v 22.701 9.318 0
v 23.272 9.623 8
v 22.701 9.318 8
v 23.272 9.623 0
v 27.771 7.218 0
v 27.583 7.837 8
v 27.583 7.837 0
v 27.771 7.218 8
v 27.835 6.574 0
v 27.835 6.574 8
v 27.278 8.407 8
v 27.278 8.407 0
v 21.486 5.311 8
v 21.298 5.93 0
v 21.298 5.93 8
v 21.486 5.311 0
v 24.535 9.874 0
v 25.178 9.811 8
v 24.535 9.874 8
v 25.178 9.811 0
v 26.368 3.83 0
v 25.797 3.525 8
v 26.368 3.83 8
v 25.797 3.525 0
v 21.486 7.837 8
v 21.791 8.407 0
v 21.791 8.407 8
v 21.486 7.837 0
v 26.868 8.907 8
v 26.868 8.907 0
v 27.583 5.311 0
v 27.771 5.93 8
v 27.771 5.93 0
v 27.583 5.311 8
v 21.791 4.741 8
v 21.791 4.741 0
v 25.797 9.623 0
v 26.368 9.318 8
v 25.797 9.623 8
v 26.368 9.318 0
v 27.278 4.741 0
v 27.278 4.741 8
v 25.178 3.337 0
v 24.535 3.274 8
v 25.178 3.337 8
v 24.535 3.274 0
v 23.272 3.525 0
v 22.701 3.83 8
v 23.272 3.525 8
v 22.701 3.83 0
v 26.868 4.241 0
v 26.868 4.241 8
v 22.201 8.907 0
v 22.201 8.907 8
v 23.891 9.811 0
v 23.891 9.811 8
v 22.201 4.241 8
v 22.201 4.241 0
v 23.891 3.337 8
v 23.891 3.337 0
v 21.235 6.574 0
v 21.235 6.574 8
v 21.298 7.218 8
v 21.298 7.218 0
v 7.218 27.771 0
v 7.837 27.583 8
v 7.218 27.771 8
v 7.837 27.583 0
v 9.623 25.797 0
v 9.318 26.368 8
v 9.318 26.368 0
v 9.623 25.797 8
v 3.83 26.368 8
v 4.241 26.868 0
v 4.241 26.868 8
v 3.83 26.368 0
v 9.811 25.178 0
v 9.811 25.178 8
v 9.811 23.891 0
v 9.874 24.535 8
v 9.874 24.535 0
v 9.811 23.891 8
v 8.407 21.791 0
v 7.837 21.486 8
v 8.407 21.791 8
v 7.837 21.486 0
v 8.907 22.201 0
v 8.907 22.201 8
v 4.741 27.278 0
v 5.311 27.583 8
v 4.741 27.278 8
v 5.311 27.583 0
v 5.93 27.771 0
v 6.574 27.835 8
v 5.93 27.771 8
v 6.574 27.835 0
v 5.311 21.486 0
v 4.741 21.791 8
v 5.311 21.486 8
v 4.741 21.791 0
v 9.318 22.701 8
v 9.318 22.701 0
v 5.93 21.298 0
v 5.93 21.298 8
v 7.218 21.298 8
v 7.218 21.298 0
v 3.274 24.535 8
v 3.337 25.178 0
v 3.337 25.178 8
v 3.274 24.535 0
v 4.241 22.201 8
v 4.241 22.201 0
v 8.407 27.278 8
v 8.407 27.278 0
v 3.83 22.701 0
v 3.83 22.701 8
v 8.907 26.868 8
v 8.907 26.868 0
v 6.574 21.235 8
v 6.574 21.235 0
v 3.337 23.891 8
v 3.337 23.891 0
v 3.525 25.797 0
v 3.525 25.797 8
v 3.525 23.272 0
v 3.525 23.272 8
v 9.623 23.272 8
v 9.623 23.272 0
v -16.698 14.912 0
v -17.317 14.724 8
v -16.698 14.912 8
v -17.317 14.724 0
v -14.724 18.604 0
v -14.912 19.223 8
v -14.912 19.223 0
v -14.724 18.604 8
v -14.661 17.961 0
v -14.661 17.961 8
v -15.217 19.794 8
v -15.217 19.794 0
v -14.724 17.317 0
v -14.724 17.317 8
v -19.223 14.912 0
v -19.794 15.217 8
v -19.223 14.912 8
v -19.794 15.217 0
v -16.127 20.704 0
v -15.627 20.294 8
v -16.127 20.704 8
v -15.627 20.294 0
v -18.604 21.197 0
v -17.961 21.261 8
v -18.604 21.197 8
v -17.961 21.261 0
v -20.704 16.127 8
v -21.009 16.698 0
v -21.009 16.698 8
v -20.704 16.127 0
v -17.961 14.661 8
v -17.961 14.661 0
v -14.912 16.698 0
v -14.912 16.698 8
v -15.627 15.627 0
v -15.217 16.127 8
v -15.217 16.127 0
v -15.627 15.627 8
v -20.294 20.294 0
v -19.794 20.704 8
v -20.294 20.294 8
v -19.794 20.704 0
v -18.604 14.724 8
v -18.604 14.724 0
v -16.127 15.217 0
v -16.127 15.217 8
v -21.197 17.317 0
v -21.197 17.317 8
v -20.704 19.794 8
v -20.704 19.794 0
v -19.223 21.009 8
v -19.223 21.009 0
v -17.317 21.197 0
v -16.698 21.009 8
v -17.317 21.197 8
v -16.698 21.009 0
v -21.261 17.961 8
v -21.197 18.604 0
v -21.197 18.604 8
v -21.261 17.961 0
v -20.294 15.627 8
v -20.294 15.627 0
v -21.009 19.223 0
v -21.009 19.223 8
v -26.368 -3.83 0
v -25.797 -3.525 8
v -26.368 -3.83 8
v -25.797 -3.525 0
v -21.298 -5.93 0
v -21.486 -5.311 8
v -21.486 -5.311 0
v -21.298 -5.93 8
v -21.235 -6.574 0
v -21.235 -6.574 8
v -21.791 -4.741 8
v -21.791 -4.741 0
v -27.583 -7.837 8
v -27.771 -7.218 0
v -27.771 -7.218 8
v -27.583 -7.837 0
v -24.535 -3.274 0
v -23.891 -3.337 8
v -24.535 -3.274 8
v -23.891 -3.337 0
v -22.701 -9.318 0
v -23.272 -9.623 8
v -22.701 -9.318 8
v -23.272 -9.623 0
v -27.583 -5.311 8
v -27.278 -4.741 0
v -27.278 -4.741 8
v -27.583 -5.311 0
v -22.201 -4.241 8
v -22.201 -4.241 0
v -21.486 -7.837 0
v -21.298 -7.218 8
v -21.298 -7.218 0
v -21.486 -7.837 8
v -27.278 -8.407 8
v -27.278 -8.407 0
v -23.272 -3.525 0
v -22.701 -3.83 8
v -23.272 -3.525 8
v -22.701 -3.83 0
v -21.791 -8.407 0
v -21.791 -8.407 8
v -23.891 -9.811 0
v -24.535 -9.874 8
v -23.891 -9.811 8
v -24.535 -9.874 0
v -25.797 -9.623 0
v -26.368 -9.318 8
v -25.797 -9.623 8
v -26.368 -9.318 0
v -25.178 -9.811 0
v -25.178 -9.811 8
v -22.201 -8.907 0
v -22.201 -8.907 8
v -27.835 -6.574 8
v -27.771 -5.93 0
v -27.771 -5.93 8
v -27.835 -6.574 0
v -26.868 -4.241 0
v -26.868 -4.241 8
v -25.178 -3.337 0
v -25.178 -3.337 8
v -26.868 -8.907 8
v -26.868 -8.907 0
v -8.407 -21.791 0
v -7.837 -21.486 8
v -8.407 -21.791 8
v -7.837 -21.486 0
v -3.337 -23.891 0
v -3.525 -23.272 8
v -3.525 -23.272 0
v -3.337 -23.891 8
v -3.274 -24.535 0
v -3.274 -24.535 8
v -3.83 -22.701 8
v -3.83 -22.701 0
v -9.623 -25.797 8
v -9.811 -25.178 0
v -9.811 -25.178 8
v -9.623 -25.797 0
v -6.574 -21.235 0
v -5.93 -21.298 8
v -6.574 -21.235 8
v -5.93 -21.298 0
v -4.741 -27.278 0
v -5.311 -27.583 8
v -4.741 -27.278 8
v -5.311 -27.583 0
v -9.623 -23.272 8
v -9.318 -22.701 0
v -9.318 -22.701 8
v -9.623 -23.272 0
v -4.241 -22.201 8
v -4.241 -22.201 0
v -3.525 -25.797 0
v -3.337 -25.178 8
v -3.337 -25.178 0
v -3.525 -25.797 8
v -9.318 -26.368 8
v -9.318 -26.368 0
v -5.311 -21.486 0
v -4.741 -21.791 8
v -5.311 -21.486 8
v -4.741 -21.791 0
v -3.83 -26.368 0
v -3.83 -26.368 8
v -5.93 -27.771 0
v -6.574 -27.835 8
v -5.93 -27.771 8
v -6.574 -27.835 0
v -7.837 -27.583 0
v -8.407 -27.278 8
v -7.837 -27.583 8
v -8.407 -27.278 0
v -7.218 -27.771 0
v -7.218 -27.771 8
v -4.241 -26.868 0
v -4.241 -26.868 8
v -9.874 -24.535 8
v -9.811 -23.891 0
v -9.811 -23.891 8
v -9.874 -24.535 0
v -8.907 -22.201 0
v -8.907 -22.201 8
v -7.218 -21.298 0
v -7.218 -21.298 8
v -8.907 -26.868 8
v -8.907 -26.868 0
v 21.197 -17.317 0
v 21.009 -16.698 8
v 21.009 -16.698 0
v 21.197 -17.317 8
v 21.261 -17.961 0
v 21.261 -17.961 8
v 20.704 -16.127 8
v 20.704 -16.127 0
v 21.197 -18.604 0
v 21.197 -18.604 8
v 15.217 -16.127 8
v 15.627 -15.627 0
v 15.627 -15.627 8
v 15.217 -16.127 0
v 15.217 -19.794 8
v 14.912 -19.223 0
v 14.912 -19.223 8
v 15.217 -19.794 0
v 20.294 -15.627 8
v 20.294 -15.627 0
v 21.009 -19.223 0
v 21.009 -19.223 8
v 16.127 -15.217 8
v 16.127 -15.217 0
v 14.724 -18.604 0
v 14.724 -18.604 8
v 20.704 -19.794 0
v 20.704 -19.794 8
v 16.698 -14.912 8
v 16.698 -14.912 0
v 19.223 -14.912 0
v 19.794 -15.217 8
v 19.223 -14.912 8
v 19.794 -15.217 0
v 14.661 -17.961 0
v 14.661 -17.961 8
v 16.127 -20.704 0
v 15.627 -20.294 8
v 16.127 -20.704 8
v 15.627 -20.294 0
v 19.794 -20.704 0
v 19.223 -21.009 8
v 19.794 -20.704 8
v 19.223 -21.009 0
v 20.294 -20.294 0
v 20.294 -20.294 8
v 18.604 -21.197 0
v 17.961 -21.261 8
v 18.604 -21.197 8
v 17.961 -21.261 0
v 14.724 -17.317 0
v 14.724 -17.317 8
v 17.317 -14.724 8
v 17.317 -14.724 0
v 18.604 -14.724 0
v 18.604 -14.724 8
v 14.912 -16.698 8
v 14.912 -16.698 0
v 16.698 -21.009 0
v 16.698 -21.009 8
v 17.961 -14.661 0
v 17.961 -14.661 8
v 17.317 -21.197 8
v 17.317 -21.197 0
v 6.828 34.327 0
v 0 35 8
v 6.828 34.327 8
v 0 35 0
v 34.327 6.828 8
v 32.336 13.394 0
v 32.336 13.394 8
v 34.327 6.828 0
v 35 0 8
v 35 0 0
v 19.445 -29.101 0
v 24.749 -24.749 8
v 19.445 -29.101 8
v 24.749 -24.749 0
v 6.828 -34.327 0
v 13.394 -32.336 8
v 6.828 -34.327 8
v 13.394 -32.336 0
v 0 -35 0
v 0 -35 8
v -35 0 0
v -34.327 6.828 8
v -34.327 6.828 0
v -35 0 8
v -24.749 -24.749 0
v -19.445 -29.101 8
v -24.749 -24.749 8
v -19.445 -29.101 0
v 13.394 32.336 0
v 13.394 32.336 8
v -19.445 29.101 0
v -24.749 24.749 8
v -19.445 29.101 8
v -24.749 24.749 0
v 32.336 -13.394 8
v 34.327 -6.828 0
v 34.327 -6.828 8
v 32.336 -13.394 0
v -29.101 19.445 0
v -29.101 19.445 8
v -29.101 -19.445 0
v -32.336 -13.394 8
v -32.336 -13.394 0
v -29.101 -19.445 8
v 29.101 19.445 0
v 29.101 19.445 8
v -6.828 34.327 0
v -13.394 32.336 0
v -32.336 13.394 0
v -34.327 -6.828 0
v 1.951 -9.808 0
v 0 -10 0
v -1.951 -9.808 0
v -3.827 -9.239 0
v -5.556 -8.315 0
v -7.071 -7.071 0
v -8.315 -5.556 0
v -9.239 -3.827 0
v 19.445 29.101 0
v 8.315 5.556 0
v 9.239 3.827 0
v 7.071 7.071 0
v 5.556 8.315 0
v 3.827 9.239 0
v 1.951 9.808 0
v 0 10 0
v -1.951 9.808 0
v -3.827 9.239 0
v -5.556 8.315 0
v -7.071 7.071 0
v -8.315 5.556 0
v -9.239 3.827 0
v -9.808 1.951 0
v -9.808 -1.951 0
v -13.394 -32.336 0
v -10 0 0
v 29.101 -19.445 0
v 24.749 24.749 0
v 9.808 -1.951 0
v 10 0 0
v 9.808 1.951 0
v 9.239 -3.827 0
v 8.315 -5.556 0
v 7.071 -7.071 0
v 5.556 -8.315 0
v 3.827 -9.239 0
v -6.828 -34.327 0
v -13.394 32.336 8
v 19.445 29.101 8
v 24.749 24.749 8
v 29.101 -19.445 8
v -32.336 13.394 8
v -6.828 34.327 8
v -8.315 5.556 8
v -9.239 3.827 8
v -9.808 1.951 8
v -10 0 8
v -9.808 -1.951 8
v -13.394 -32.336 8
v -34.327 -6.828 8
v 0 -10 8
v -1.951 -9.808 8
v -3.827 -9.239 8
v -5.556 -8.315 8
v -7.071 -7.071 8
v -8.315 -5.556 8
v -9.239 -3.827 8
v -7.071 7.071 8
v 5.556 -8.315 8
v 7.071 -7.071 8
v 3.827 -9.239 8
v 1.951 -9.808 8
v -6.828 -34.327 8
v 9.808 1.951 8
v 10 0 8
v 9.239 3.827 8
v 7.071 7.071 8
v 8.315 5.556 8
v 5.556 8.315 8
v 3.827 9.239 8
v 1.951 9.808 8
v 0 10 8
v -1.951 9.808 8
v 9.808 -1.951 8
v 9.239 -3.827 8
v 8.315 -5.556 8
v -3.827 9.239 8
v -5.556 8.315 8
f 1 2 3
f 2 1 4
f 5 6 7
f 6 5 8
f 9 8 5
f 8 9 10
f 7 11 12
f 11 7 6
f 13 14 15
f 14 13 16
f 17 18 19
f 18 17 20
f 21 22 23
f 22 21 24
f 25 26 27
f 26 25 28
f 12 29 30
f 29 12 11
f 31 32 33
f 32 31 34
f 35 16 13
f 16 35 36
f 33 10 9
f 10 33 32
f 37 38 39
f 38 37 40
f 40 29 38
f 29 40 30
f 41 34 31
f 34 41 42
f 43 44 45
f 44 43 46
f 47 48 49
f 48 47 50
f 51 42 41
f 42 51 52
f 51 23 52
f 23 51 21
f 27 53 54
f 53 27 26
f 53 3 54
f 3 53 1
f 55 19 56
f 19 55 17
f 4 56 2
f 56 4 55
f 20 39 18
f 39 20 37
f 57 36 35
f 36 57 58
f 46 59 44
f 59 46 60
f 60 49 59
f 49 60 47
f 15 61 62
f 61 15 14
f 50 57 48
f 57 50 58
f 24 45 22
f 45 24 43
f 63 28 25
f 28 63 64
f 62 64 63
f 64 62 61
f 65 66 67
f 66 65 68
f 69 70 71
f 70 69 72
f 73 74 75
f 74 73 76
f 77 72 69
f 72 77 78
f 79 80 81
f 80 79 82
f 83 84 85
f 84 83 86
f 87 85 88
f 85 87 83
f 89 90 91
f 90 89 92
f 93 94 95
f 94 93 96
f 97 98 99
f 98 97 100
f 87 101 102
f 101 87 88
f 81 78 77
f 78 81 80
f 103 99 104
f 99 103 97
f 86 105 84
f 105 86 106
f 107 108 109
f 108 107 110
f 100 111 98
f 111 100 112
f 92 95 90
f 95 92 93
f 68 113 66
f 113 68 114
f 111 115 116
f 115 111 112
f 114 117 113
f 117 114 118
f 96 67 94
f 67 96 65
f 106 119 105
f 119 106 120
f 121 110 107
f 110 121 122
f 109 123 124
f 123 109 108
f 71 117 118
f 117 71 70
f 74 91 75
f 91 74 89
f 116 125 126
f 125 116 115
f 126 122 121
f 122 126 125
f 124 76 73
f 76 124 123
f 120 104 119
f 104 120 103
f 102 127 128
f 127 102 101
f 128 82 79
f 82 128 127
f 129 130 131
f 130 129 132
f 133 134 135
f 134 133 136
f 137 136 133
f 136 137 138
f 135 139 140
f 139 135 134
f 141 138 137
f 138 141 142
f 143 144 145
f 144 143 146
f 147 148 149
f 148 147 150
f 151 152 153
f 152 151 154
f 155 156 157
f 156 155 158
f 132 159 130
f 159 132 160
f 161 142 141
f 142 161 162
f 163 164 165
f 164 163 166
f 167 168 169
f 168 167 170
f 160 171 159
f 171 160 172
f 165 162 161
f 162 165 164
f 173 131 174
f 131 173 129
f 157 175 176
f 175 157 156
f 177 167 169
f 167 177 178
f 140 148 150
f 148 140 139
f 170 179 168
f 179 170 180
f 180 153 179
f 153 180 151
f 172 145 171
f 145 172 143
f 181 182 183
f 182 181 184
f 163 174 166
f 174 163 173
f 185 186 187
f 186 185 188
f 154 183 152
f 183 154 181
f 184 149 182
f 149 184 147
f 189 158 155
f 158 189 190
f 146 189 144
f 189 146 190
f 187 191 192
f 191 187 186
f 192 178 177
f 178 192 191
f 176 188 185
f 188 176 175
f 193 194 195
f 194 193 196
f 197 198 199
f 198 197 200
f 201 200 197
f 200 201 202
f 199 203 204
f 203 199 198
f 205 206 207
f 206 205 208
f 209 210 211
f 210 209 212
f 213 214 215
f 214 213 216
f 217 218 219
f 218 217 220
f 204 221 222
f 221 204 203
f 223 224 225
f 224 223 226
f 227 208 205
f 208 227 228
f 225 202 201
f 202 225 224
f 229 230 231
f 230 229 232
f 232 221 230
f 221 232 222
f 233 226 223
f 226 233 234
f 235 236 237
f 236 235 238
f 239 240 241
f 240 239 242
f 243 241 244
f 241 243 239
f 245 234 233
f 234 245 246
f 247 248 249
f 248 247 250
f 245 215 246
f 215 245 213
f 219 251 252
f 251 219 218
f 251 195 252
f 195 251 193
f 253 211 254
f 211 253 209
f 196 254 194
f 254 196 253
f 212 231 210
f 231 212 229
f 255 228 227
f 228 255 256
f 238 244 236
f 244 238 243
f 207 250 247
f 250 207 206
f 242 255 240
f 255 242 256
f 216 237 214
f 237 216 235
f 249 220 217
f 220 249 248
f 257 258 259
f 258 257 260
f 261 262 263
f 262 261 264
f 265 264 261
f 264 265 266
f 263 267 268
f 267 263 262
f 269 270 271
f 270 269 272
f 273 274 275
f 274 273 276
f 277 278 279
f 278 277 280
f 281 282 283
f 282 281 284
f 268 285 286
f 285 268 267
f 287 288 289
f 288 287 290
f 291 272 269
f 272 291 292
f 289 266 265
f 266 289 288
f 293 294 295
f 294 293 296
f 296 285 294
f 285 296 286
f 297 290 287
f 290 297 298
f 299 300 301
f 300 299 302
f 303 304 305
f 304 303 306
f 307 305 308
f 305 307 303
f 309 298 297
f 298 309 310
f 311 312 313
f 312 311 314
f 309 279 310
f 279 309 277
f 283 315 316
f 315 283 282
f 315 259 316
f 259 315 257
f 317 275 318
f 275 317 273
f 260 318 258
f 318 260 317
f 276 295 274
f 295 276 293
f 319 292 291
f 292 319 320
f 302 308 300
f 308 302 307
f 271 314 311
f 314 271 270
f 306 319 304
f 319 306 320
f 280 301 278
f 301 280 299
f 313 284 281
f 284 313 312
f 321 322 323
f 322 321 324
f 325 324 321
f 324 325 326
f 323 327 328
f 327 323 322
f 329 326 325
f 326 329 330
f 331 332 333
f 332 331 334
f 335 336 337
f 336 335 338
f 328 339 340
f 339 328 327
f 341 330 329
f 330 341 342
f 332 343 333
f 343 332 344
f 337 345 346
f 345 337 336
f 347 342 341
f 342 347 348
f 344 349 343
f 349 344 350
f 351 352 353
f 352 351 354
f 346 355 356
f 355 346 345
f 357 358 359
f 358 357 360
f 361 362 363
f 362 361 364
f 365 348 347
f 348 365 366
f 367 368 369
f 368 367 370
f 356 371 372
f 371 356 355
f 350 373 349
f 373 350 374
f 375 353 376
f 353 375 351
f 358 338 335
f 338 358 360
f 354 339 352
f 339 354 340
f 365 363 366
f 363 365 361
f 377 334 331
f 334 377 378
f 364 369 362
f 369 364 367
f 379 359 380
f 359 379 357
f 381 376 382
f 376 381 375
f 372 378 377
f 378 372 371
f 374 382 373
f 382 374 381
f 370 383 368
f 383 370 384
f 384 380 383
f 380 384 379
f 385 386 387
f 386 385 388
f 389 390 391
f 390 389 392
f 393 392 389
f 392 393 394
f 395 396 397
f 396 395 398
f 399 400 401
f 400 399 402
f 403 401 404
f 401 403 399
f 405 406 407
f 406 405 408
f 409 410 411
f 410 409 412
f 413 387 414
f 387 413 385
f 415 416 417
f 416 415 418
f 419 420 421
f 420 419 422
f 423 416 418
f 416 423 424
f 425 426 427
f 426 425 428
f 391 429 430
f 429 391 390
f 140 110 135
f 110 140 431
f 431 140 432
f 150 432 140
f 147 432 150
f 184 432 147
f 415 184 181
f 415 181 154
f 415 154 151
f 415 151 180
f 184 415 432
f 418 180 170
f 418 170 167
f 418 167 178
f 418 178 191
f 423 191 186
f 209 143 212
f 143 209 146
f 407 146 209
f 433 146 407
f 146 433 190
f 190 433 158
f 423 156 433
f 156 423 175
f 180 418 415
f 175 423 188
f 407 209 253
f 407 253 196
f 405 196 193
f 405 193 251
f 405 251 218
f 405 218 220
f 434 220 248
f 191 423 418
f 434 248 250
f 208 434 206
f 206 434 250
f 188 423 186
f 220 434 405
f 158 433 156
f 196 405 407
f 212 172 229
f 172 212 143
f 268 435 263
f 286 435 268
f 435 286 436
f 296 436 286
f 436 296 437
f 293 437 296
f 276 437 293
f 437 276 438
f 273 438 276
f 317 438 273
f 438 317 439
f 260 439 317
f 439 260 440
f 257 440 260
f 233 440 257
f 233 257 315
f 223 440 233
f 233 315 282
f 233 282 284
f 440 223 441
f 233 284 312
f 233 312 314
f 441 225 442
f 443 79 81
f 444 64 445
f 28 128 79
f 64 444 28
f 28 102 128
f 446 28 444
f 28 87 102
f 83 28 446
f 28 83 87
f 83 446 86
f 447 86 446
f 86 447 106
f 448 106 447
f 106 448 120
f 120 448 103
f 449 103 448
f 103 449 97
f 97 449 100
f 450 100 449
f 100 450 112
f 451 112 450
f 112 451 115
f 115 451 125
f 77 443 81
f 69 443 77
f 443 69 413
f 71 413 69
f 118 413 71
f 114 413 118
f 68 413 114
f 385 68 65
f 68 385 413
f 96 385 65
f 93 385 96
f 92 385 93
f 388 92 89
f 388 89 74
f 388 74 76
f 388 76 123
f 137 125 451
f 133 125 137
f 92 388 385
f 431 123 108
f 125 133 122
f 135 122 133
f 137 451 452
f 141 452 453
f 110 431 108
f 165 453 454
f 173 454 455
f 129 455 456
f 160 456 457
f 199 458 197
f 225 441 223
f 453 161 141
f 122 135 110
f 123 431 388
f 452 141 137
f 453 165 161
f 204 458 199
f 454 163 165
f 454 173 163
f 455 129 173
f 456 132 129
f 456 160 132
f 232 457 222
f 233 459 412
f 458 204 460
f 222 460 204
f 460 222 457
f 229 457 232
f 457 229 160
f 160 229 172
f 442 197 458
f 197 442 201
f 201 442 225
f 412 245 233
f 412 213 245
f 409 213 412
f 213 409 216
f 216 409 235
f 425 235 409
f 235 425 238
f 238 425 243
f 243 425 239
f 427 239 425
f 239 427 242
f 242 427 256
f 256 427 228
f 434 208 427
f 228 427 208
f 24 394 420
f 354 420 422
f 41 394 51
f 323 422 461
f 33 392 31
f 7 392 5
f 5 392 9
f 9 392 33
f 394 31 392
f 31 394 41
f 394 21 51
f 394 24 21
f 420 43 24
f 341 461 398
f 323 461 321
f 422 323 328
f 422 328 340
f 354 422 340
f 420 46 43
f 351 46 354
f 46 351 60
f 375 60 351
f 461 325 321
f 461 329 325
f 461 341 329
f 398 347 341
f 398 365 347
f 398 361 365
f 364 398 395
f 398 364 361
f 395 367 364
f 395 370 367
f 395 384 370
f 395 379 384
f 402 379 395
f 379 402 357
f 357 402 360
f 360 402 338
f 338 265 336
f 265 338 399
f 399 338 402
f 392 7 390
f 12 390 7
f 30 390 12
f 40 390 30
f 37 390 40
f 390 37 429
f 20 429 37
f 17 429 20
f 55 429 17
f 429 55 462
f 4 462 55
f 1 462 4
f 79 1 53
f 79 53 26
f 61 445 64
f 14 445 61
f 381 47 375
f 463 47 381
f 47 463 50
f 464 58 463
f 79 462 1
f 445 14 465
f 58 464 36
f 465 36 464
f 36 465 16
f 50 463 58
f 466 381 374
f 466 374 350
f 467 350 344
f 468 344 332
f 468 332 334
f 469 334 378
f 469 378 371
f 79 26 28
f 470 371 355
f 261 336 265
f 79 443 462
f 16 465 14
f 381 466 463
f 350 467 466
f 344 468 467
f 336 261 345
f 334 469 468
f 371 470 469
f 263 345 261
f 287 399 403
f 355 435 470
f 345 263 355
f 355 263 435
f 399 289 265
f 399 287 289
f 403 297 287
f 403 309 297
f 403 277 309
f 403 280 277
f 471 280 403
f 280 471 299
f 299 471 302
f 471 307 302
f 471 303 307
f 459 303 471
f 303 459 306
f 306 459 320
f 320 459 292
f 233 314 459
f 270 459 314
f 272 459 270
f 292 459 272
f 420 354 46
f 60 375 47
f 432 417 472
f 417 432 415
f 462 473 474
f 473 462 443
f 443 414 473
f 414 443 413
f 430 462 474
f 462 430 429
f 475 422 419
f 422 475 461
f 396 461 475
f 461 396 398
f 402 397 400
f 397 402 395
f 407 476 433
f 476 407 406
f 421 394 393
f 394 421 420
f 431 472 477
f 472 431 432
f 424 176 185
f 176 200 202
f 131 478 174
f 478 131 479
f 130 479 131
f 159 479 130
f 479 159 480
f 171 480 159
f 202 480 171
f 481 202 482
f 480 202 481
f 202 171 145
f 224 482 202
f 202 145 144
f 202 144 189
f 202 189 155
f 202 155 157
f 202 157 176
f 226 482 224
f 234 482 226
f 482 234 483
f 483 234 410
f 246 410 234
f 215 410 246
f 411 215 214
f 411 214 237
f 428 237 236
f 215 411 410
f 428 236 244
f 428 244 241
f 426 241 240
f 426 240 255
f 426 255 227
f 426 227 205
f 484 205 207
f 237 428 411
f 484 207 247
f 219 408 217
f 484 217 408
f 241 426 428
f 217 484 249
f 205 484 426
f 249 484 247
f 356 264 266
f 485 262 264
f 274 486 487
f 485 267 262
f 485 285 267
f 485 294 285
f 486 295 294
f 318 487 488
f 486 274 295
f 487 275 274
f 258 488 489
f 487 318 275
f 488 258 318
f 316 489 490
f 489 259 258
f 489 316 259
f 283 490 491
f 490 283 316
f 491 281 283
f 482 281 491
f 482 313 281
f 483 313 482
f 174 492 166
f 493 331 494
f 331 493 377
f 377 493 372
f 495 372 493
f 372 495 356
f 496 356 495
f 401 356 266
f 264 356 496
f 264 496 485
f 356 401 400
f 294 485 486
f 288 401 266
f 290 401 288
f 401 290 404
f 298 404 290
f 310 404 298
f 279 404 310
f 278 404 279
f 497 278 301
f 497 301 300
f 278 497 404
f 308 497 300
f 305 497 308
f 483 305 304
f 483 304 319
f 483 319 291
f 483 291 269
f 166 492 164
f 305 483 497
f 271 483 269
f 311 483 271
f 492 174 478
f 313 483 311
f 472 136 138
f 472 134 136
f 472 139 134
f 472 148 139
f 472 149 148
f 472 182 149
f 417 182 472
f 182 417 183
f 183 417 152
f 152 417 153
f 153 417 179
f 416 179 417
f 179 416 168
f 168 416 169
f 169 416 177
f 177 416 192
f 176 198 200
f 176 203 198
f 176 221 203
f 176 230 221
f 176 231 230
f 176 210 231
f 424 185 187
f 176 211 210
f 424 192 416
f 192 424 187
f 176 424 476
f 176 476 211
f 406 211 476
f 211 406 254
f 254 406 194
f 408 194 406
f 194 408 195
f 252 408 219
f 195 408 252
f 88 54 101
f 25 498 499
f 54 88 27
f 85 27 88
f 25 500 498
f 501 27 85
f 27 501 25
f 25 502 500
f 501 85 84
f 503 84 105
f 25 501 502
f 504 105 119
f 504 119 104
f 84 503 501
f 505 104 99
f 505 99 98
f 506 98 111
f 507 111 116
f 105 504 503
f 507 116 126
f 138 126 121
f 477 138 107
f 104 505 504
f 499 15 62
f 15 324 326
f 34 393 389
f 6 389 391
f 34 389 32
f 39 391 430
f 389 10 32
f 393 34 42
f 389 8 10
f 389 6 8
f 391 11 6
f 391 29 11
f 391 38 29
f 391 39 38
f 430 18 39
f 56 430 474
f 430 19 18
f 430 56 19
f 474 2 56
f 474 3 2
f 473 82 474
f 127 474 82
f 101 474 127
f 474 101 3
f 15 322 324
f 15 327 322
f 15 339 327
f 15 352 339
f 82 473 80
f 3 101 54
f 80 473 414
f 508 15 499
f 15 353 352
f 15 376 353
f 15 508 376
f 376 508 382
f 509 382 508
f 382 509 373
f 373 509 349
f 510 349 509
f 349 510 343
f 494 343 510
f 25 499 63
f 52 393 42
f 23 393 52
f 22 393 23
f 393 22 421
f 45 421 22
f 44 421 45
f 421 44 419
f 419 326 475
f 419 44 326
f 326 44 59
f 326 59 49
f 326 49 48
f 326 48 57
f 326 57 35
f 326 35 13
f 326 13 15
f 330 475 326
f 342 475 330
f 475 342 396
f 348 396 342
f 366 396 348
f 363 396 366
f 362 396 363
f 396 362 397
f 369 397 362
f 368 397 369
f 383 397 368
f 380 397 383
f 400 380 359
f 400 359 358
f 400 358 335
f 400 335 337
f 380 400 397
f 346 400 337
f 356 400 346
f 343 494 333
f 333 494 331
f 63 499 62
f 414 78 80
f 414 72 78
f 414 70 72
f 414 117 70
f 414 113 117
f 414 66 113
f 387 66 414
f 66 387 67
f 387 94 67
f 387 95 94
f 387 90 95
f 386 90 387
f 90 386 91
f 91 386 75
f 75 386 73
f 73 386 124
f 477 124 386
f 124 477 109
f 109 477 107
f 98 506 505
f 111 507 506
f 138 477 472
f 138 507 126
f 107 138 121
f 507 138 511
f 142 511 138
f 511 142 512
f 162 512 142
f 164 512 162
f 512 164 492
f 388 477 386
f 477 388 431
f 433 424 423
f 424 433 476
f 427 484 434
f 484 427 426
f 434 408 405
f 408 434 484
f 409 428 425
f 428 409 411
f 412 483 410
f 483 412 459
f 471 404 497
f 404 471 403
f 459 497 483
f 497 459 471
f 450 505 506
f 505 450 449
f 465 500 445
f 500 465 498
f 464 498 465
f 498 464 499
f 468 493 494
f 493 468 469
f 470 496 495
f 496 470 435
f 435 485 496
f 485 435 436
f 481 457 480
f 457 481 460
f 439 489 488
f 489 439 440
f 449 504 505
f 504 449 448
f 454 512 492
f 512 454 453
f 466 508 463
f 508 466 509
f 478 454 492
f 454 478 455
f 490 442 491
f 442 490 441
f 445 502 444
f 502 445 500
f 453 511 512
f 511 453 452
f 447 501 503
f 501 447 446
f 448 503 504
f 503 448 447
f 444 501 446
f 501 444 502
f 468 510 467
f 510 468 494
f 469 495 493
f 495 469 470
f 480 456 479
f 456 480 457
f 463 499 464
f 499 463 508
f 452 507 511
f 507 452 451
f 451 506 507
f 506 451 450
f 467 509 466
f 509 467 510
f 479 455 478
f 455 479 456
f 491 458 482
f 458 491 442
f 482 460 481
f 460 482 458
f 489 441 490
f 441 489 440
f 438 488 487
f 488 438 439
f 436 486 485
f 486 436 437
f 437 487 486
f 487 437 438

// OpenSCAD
$fn = 32;

// ----------------------------------------------------------------------
// Flange Ø70 x 8
// 6 holes on a Ø50.8 bolt circle, bolted joints
// ----------------------------------------------------------------------

// --- parameters (mm) ---
flange_d = 70;   // outside diameter of the flange
thickness = 8;   // flange thickness
holes = 6;       // number of bolt holes
pcd = 50.8;      // bolt circle diameter
start_deg = 15;  // angle of the first hole, from +X
hole_d = 6.6;    // bolt hole diameter
bore_d = 20;     // central through bore
hub_d = 28;      // hub outside diameter
hub_h = 0;       // hub height above the flange face (0 = no hub)

// --- derived feature positions (mm) ---
height = thickness + hub_h;  // = 8   overall height of the part
pcd_r = pcd / 2;             // = 25.4   bolt circle radius
hole_step = 360 / holes;     // = 60   angular pitch
feature_centers = [
  [pcd_r * cos(start_deg + 0 * hole_step), pcd_r * sin(start_deg + 0 * hole_step)],
  [pcd_r * cos(start_deg + 1 * hole_step), pcd_r * sin(start_deg + 1 * hole_step)],
  [pcd_r * cos(start_deg + 2 * hole_step), pcd_r * sin(start_deg + 2 * hole_step)],
  [pcd_r * cos(start_deg + 3 * hole_step), pcd_r * sin(start_deg + 3 * hole_step)],
  [pcd_r * cos(start_deg + 4 * hole_step), pcd_r * sin(start_deg + 4 * hole_step)],
  [pcd_r * cos(start_deg + 5 * hole_step), pcd_r * sin(start_deg + 5 * hole_step)]
];   // bolt hole centres on the pitch circle

// flange disc, every hole and the bore cut straight through
difference() {
  union() {
    cylinder(d = flange_d, h = thickness);
  }
  translate([0, 0, -1]) cylinder(d = bore_d, h = height + 2);  // bore, through
  for (centre = feature_centers)
    translate([centre[0], centre[1], -1]) cylinder(d = hole_d, h = thickness + 2);
}
